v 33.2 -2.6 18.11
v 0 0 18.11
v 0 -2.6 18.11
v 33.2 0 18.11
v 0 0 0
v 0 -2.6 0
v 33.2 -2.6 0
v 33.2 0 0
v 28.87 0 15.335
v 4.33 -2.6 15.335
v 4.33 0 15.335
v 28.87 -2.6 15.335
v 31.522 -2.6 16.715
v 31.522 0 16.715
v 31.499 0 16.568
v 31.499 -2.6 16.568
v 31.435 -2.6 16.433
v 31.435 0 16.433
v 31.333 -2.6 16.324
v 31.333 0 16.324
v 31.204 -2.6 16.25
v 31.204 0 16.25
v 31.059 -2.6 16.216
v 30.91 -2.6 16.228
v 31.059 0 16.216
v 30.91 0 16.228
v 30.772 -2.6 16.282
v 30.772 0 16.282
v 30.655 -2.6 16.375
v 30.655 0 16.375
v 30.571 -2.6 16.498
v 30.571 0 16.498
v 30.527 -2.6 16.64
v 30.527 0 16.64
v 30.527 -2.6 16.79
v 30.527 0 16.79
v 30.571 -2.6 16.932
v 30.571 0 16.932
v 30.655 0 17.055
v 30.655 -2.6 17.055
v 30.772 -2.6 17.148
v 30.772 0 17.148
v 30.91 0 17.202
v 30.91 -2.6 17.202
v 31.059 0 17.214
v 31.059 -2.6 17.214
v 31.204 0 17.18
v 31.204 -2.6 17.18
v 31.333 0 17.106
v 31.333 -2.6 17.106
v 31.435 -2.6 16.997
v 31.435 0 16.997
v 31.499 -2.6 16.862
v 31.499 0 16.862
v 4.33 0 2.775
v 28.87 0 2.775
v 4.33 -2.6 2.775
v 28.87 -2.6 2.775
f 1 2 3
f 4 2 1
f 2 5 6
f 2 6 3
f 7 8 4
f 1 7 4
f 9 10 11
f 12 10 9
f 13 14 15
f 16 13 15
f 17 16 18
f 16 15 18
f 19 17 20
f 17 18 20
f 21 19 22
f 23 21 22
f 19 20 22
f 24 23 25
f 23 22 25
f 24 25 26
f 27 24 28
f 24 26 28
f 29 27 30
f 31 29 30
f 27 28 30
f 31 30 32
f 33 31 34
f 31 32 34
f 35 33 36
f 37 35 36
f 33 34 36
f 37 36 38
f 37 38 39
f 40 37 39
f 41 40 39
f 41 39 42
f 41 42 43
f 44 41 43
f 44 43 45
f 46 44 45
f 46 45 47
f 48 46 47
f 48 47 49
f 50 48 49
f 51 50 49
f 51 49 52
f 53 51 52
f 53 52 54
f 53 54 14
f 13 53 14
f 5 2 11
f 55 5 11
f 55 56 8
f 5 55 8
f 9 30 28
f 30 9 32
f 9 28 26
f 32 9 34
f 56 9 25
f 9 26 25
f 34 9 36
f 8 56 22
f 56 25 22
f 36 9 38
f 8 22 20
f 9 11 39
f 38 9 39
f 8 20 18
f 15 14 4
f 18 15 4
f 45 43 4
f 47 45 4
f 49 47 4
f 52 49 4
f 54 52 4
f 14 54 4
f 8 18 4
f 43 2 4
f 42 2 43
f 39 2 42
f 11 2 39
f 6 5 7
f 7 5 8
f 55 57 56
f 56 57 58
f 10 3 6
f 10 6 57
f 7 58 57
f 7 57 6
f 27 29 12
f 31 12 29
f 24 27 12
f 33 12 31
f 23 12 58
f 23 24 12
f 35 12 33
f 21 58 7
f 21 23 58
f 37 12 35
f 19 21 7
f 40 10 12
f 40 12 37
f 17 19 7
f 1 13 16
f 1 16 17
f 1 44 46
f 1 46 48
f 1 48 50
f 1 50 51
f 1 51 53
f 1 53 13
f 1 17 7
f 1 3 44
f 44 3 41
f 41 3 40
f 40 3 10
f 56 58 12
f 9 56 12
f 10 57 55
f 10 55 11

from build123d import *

# Parameters (mm, degrees)
SKETCH_W        = 33.2
SKETCH_H        = 18.11
PAD_DEPTH       = 2.6
SKETCH002_W     = 24.54
SKETCH002_H     = 12.56
POCKET_DEPTH    = 2.6
SKETCH003_R     = 0.5
POCKET001_DEPTH = 5


with BuildPart() as part:
    # Sketch → Pad (new body)
    with BuildSketch(Plane.XZ):
        with Locations((16.6, 9.055)):
            Rectangle(SKETCH_W, SKETCH_H)
    extrude(amount=PAD_DEPTH)

    # Sketch002 (on Face6 of Pad) → Pocket (cut)
    with BuildSketch(Plane.XZ.offset(2.6)):
        with Locations((16.6, 9.055)):
            Rectangle(SKETCH002_W, SKETCH002_H)
    extrude(amount=-POCKET_DEPTH, mode=Mode.SUBTRACT)

    # Sketch003 (on Face4 of Pocket) → Pocket001 (cut)
    with BuildSketch(Plane(origin=(0, 0, 0), x_dir=(1, 0, 0), z_dir=(0, 1, 0))):
        with Locations((31.0215, -16.715)):
            Circle(SKETCH003_R)
    extrude(amount=-POCKET001_DEPTH, mode=Mode.SUBTRACT)


solid = part.part
